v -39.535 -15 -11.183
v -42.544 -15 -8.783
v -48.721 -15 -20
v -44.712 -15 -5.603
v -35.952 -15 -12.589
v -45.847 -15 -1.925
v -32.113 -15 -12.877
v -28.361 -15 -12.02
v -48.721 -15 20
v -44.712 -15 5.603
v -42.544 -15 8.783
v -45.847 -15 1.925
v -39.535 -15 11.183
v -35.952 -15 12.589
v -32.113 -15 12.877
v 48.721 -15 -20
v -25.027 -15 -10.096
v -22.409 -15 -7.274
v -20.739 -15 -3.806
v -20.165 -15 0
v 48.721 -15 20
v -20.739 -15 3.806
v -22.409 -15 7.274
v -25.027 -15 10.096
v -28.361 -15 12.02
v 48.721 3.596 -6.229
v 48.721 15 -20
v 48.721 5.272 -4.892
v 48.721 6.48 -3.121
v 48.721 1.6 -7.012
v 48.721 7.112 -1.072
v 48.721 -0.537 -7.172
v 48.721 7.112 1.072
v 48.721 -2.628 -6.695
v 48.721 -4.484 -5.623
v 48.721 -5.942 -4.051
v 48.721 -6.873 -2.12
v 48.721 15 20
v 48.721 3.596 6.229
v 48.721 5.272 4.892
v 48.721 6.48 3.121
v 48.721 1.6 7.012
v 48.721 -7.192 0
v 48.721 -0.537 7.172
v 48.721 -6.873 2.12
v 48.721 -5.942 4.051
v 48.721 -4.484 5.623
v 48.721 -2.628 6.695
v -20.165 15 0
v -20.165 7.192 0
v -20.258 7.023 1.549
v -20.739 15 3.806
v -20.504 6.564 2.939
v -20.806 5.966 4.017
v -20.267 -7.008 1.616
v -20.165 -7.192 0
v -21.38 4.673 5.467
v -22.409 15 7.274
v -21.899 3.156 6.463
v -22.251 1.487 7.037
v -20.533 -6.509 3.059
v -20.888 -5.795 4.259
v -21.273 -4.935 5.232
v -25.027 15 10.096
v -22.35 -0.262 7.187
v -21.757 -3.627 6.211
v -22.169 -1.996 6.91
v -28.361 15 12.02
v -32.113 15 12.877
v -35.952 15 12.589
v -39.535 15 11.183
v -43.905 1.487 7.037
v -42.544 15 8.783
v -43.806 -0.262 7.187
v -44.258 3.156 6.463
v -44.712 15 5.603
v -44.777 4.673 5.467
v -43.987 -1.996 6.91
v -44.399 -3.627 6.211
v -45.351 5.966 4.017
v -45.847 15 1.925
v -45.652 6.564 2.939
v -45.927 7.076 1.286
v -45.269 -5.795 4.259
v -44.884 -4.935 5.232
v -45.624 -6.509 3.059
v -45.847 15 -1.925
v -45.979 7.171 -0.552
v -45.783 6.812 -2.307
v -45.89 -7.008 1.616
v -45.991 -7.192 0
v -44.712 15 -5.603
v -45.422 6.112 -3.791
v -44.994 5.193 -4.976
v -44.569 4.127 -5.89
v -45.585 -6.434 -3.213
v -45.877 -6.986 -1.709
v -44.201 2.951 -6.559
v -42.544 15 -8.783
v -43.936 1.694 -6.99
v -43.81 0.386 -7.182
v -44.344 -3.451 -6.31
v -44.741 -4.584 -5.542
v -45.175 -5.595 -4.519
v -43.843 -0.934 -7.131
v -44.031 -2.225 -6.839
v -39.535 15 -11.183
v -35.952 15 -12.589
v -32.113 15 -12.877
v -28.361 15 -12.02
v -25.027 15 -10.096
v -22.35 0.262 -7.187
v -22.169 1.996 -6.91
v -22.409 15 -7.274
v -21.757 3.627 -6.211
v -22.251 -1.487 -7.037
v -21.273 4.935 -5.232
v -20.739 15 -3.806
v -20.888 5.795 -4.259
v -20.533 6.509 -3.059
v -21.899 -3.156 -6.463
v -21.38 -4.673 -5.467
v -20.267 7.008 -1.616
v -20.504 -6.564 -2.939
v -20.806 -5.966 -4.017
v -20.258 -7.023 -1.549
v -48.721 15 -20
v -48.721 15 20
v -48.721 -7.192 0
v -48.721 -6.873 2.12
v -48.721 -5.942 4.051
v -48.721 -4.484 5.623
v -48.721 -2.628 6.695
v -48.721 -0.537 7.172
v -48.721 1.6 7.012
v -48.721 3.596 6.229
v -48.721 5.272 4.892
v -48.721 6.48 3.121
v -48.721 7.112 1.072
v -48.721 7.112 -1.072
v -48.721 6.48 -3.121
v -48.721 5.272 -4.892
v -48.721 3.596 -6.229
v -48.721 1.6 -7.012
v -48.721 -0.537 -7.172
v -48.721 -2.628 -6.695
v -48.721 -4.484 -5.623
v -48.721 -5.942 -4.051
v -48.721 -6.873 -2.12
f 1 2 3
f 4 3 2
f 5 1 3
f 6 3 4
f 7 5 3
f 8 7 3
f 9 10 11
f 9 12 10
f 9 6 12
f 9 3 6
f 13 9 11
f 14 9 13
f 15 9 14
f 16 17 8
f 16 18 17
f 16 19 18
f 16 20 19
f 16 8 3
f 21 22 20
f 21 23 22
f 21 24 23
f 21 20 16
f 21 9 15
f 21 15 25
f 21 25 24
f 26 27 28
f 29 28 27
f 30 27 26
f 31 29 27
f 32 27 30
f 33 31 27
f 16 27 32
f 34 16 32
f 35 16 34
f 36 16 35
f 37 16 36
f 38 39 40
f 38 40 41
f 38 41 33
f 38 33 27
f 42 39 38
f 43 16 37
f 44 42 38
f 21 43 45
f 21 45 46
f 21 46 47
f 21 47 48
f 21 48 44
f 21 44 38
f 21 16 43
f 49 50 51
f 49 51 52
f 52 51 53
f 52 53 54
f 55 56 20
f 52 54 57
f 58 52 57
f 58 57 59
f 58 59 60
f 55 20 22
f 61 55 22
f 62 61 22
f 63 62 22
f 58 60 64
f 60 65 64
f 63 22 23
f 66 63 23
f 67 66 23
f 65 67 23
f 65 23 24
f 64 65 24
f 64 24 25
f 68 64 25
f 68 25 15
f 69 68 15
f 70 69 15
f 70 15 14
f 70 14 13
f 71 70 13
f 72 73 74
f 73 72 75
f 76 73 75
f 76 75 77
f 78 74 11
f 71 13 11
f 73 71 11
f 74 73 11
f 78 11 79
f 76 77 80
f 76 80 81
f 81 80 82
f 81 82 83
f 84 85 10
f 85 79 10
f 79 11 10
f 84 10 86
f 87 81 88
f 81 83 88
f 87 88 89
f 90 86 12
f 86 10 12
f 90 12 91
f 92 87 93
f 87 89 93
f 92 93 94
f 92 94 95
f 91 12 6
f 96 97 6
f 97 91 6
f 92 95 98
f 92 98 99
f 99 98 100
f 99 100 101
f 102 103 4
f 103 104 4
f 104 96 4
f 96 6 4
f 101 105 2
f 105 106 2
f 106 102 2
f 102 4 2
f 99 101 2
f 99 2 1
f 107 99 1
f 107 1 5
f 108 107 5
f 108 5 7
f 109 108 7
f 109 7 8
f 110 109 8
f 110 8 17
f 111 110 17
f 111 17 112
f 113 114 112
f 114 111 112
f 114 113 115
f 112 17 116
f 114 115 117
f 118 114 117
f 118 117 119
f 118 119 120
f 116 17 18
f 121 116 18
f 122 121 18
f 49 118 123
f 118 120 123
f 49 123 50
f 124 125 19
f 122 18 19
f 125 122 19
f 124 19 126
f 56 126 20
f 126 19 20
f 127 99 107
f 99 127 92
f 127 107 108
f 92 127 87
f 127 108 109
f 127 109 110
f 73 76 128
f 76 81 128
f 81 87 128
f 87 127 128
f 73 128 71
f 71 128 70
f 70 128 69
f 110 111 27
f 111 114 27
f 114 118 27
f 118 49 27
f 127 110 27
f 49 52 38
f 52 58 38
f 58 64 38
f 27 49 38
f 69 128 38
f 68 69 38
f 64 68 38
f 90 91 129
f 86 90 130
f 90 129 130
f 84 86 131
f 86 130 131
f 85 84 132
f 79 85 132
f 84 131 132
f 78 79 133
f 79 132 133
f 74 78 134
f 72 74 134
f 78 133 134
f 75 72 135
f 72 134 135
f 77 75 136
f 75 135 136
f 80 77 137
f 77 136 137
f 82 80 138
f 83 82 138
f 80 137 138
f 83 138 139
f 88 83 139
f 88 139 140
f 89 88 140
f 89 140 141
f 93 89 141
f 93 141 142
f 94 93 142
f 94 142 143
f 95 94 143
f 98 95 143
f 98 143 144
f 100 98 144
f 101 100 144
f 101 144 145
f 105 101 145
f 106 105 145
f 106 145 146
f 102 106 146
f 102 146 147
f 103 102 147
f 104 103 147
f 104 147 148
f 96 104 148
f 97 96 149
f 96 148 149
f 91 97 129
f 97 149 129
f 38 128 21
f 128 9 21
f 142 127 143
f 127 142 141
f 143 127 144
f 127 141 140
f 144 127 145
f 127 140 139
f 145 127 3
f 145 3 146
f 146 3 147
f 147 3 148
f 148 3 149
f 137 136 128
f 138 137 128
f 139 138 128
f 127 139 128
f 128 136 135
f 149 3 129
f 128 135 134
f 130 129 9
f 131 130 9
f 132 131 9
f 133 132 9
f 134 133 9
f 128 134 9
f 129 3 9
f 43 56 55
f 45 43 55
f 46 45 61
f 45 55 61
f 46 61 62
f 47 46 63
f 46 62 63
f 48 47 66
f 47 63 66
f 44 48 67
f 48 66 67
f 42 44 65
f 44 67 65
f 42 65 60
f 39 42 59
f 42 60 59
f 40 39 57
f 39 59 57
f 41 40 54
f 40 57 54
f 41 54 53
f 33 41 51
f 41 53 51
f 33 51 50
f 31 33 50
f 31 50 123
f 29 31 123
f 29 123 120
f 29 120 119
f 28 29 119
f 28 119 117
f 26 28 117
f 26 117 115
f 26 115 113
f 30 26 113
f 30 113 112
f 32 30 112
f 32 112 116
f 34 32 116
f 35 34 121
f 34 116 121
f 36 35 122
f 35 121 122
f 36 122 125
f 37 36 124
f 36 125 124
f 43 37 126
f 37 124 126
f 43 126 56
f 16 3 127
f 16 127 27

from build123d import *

# Parameters (mm, degrees)
F0_W     = 97.442076
F0_H     = 40
F1_DEPTH = 15
F2_R     = 12.912954
F3_DEPTH = 100
F4_R     = 7.192075
F5_DEPTH = 1000


with BuildPart() as f1:
    # F0 (on Front) → F1 (new body, symmetric)
    with BuildSketch(Plane.XZ):
        Rectangle(F0_W, F0_H)
    extrude(amount=F1_DEPTH, both=True)

    # F2 (on face) → F3 (cut)
    with BuildSketch(Plane.XZ.offset(15)):
        with Locations((-33.078179, 0)):
            Circle(F2_R)
    extrude(amount=-F3_DEPTH, mode=Mode.SUBTRACT)

    # F4 (on face) → F5 (cut)
    with BuildSketch(Plane(origin=(-48.721038, 0, 0), x_dir=(0, -1, 0), z_dir=(-1, 0, 0))):
        Circle(F4_R)
    extrude(amount=-F5_DEPTH, mode=Mode.SUBTRACT)


solid = f1.part
